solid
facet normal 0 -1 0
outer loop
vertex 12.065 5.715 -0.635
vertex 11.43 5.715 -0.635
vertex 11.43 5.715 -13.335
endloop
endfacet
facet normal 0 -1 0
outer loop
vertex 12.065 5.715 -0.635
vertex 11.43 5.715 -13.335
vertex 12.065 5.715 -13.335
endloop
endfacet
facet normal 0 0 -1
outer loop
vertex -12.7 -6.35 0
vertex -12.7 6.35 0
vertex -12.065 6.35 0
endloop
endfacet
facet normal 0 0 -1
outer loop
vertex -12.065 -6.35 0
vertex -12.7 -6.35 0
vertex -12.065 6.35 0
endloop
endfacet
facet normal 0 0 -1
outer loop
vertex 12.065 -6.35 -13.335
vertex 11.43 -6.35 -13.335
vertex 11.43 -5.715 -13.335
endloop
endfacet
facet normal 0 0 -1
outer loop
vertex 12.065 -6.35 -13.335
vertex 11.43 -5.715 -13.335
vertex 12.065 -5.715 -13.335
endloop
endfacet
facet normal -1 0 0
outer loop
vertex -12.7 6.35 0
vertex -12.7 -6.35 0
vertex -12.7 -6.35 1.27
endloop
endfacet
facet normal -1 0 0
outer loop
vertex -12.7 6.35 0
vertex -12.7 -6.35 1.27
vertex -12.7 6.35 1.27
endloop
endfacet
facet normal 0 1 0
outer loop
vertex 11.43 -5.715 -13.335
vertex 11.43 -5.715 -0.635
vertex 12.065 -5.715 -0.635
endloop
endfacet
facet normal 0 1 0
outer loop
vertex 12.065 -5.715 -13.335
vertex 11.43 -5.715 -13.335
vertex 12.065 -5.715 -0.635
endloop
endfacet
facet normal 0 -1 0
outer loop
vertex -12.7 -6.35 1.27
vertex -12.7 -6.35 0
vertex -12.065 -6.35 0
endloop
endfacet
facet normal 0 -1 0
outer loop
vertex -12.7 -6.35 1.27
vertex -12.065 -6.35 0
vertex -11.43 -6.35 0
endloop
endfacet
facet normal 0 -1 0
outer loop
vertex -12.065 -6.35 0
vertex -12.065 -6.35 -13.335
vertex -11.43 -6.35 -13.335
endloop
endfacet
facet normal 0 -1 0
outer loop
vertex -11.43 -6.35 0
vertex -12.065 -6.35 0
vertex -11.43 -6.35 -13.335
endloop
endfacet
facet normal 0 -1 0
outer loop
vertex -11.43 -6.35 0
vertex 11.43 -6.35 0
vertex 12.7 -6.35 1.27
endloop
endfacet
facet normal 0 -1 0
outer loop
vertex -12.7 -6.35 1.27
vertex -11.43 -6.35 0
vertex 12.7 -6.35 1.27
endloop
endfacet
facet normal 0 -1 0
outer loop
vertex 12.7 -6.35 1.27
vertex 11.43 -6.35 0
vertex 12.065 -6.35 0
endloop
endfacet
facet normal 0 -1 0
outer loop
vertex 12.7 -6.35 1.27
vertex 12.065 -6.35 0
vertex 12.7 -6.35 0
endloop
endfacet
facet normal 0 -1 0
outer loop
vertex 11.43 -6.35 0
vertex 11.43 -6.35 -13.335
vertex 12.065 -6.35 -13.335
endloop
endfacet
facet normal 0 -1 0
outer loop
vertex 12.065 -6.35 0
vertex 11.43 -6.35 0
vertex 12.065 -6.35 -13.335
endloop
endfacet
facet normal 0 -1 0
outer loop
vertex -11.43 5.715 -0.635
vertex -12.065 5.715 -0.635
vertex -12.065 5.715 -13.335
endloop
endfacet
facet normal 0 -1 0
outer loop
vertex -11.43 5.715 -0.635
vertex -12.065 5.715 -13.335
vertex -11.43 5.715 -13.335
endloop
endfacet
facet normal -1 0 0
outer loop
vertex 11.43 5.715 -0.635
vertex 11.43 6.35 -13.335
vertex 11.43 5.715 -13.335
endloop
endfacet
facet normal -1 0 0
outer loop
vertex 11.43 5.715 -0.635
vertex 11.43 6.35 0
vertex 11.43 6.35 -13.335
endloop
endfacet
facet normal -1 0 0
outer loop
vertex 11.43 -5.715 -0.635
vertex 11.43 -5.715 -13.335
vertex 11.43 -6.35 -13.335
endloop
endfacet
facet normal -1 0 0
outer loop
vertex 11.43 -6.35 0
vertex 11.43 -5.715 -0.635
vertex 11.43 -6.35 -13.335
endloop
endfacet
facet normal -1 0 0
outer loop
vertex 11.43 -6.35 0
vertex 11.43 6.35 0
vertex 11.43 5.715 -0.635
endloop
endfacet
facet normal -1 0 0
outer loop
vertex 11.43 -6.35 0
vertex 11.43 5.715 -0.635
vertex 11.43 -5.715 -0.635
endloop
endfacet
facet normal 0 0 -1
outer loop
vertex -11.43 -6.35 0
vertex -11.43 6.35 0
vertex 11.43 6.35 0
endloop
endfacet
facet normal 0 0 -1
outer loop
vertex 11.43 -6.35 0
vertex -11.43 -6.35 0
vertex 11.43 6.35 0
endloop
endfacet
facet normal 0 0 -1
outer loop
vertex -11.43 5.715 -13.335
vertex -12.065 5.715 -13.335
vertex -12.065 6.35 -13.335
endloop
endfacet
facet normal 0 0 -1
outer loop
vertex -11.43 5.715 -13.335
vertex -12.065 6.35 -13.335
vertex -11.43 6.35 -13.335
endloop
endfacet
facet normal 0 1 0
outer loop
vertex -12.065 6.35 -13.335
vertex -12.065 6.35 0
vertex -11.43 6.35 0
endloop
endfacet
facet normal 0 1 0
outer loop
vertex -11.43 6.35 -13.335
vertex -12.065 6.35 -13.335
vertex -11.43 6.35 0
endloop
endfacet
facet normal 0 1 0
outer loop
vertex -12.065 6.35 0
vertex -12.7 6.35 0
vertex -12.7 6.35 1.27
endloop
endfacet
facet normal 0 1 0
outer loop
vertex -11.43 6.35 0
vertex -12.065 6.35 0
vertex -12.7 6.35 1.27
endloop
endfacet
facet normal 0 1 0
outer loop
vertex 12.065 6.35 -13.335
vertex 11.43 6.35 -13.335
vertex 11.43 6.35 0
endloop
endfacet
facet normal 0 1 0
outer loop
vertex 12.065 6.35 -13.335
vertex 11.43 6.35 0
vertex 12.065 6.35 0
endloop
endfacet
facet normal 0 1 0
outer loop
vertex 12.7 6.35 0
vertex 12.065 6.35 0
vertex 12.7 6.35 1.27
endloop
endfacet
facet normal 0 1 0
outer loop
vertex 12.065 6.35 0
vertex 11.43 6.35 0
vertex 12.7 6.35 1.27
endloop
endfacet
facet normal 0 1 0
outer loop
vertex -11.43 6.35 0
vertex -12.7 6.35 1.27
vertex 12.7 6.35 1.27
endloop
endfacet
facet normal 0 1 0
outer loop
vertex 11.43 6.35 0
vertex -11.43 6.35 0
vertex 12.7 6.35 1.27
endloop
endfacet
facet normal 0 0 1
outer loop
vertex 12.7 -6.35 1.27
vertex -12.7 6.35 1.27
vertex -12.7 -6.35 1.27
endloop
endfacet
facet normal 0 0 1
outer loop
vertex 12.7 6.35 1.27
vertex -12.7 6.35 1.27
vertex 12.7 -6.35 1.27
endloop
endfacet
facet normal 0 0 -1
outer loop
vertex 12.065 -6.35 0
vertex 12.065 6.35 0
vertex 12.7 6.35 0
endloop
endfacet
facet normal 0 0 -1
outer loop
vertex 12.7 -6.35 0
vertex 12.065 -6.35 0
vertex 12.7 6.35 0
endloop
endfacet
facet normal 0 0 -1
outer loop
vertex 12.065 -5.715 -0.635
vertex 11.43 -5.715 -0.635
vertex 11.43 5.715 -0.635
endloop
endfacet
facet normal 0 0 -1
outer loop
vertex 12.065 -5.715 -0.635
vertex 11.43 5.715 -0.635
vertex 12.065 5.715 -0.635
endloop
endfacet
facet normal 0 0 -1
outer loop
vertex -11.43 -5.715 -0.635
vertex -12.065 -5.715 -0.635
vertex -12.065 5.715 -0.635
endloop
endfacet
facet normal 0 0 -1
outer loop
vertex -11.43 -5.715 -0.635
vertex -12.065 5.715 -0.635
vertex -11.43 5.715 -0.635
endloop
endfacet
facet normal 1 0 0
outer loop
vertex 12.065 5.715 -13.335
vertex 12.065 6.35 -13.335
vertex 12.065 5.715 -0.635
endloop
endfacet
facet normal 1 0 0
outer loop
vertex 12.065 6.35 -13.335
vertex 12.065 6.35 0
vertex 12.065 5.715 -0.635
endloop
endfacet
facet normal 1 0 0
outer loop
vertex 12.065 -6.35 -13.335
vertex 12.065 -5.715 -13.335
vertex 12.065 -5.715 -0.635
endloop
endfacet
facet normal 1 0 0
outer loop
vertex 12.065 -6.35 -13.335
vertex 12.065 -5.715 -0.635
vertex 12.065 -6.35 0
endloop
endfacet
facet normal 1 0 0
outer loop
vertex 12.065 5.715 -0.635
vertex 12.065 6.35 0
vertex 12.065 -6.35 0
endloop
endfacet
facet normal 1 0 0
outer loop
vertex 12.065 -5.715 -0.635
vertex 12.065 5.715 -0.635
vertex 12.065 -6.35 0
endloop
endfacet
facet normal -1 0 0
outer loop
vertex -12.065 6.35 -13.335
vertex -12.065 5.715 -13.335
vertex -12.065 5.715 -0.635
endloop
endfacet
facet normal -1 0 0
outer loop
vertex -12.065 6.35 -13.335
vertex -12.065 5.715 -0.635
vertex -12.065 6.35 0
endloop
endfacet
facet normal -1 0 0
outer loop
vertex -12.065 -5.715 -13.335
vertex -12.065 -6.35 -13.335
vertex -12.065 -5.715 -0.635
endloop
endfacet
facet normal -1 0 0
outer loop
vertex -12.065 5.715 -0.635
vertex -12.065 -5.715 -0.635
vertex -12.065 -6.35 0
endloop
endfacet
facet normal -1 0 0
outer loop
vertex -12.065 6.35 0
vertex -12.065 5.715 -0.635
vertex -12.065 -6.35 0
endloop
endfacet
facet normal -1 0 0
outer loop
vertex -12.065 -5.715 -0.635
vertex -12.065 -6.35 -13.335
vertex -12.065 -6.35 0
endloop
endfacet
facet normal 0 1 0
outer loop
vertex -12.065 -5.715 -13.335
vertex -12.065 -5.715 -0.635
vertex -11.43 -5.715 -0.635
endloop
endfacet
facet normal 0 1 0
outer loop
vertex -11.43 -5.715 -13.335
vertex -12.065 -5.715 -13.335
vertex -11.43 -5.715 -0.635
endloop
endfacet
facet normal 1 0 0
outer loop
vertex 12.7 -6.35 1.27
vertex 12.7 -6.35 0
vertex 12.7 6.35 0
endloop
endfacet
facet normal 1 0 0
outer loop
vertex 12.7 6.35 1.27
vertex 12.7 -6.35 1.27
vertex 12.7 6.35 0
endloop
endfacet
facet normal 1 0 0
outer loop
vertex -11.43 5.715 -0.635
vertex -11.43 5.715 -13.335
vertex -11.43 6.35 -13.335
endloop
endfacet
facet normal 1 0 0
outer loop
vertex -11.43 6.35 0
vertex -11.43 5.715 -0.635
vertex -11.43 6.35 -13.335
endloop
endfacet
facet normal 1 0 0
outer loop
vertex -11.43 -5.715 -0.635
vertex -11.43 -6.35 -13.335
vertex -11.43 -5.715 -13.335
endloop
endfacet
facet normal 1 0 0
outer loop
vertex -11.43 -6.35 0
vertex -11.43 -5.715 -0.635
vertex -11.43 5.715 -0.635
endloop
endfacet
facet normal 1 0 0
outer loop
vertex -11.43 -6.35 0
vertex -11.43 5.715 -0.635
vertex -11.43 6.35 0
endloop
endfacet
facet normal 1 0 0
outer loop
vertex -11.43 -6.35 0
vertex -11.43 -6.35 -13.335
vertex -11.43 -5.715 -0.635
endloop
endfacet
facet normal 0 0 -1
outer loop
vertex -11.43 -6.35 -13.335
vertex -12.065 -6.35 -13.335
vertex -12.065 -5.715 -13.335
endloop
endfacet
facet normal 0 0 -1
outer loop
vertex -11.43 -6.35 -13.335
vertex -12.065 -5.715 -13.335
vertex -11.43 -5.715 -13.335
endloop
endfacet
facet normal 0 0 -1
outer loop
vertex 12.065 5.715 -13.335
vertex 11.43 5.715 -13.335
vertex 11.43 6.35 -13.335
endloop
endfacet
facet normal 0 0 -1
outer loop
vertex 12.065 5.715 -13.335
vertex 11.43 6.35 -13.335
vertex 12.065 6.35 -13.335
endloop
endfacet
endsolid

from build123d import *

# Parameters (mm, degrees)
F0_W     = 25.4
F0_H     = 12.7
F1_DEPTH = 1.27
F2_W     = 0.635
F2_H     = 0.635
F3_DEPTH = 12.7
F4_W     = 0.635
F4_H     = 0.635
F5_DEPTH = 12.7


with BuildPart() as f1:
    # F0 (on Top) → F1 (new body)
    with BuildSketch(Plane.XY):
        Rectangle(F0_W, F0_H)
    extrude(amount=F1_DEPTH)

    # F2 (on face) → F3 (join)
    with BuildSketch(Plane.XZ.offset(6.35)):
        with Locations((-11.7475, -0.3175)):
            Rectangle(F2_W, F2_H)
        with Locations((11.7475, -0.3175)):
            Rectangle(F2_W, F2_H)
    extrude(amount=-F3_DEPTH)

    # F4 (on face) → F5 (join)
    with BuildSketch(Plane(origin=(0, 0, -0.635), x_dir=(1, 0, 0), z_dir=(0, 0, -1))):
        with Locations((11.7475, -6.0325)):
            Rectangle(F4_W, F4_H)
        with Locations((11.7475, 6.0325)):
            Rectangle(F4_W, F4_H)
        with Locations((-11.7475, -6.0325)):
            Rectangle(F4_W, F4_H)
        with Locations((-11.7475, 6.0325)):
            Rectangle(F4_W, F4_H)
    extrude(amount=F5_DEPTH)


solid = f1.part
